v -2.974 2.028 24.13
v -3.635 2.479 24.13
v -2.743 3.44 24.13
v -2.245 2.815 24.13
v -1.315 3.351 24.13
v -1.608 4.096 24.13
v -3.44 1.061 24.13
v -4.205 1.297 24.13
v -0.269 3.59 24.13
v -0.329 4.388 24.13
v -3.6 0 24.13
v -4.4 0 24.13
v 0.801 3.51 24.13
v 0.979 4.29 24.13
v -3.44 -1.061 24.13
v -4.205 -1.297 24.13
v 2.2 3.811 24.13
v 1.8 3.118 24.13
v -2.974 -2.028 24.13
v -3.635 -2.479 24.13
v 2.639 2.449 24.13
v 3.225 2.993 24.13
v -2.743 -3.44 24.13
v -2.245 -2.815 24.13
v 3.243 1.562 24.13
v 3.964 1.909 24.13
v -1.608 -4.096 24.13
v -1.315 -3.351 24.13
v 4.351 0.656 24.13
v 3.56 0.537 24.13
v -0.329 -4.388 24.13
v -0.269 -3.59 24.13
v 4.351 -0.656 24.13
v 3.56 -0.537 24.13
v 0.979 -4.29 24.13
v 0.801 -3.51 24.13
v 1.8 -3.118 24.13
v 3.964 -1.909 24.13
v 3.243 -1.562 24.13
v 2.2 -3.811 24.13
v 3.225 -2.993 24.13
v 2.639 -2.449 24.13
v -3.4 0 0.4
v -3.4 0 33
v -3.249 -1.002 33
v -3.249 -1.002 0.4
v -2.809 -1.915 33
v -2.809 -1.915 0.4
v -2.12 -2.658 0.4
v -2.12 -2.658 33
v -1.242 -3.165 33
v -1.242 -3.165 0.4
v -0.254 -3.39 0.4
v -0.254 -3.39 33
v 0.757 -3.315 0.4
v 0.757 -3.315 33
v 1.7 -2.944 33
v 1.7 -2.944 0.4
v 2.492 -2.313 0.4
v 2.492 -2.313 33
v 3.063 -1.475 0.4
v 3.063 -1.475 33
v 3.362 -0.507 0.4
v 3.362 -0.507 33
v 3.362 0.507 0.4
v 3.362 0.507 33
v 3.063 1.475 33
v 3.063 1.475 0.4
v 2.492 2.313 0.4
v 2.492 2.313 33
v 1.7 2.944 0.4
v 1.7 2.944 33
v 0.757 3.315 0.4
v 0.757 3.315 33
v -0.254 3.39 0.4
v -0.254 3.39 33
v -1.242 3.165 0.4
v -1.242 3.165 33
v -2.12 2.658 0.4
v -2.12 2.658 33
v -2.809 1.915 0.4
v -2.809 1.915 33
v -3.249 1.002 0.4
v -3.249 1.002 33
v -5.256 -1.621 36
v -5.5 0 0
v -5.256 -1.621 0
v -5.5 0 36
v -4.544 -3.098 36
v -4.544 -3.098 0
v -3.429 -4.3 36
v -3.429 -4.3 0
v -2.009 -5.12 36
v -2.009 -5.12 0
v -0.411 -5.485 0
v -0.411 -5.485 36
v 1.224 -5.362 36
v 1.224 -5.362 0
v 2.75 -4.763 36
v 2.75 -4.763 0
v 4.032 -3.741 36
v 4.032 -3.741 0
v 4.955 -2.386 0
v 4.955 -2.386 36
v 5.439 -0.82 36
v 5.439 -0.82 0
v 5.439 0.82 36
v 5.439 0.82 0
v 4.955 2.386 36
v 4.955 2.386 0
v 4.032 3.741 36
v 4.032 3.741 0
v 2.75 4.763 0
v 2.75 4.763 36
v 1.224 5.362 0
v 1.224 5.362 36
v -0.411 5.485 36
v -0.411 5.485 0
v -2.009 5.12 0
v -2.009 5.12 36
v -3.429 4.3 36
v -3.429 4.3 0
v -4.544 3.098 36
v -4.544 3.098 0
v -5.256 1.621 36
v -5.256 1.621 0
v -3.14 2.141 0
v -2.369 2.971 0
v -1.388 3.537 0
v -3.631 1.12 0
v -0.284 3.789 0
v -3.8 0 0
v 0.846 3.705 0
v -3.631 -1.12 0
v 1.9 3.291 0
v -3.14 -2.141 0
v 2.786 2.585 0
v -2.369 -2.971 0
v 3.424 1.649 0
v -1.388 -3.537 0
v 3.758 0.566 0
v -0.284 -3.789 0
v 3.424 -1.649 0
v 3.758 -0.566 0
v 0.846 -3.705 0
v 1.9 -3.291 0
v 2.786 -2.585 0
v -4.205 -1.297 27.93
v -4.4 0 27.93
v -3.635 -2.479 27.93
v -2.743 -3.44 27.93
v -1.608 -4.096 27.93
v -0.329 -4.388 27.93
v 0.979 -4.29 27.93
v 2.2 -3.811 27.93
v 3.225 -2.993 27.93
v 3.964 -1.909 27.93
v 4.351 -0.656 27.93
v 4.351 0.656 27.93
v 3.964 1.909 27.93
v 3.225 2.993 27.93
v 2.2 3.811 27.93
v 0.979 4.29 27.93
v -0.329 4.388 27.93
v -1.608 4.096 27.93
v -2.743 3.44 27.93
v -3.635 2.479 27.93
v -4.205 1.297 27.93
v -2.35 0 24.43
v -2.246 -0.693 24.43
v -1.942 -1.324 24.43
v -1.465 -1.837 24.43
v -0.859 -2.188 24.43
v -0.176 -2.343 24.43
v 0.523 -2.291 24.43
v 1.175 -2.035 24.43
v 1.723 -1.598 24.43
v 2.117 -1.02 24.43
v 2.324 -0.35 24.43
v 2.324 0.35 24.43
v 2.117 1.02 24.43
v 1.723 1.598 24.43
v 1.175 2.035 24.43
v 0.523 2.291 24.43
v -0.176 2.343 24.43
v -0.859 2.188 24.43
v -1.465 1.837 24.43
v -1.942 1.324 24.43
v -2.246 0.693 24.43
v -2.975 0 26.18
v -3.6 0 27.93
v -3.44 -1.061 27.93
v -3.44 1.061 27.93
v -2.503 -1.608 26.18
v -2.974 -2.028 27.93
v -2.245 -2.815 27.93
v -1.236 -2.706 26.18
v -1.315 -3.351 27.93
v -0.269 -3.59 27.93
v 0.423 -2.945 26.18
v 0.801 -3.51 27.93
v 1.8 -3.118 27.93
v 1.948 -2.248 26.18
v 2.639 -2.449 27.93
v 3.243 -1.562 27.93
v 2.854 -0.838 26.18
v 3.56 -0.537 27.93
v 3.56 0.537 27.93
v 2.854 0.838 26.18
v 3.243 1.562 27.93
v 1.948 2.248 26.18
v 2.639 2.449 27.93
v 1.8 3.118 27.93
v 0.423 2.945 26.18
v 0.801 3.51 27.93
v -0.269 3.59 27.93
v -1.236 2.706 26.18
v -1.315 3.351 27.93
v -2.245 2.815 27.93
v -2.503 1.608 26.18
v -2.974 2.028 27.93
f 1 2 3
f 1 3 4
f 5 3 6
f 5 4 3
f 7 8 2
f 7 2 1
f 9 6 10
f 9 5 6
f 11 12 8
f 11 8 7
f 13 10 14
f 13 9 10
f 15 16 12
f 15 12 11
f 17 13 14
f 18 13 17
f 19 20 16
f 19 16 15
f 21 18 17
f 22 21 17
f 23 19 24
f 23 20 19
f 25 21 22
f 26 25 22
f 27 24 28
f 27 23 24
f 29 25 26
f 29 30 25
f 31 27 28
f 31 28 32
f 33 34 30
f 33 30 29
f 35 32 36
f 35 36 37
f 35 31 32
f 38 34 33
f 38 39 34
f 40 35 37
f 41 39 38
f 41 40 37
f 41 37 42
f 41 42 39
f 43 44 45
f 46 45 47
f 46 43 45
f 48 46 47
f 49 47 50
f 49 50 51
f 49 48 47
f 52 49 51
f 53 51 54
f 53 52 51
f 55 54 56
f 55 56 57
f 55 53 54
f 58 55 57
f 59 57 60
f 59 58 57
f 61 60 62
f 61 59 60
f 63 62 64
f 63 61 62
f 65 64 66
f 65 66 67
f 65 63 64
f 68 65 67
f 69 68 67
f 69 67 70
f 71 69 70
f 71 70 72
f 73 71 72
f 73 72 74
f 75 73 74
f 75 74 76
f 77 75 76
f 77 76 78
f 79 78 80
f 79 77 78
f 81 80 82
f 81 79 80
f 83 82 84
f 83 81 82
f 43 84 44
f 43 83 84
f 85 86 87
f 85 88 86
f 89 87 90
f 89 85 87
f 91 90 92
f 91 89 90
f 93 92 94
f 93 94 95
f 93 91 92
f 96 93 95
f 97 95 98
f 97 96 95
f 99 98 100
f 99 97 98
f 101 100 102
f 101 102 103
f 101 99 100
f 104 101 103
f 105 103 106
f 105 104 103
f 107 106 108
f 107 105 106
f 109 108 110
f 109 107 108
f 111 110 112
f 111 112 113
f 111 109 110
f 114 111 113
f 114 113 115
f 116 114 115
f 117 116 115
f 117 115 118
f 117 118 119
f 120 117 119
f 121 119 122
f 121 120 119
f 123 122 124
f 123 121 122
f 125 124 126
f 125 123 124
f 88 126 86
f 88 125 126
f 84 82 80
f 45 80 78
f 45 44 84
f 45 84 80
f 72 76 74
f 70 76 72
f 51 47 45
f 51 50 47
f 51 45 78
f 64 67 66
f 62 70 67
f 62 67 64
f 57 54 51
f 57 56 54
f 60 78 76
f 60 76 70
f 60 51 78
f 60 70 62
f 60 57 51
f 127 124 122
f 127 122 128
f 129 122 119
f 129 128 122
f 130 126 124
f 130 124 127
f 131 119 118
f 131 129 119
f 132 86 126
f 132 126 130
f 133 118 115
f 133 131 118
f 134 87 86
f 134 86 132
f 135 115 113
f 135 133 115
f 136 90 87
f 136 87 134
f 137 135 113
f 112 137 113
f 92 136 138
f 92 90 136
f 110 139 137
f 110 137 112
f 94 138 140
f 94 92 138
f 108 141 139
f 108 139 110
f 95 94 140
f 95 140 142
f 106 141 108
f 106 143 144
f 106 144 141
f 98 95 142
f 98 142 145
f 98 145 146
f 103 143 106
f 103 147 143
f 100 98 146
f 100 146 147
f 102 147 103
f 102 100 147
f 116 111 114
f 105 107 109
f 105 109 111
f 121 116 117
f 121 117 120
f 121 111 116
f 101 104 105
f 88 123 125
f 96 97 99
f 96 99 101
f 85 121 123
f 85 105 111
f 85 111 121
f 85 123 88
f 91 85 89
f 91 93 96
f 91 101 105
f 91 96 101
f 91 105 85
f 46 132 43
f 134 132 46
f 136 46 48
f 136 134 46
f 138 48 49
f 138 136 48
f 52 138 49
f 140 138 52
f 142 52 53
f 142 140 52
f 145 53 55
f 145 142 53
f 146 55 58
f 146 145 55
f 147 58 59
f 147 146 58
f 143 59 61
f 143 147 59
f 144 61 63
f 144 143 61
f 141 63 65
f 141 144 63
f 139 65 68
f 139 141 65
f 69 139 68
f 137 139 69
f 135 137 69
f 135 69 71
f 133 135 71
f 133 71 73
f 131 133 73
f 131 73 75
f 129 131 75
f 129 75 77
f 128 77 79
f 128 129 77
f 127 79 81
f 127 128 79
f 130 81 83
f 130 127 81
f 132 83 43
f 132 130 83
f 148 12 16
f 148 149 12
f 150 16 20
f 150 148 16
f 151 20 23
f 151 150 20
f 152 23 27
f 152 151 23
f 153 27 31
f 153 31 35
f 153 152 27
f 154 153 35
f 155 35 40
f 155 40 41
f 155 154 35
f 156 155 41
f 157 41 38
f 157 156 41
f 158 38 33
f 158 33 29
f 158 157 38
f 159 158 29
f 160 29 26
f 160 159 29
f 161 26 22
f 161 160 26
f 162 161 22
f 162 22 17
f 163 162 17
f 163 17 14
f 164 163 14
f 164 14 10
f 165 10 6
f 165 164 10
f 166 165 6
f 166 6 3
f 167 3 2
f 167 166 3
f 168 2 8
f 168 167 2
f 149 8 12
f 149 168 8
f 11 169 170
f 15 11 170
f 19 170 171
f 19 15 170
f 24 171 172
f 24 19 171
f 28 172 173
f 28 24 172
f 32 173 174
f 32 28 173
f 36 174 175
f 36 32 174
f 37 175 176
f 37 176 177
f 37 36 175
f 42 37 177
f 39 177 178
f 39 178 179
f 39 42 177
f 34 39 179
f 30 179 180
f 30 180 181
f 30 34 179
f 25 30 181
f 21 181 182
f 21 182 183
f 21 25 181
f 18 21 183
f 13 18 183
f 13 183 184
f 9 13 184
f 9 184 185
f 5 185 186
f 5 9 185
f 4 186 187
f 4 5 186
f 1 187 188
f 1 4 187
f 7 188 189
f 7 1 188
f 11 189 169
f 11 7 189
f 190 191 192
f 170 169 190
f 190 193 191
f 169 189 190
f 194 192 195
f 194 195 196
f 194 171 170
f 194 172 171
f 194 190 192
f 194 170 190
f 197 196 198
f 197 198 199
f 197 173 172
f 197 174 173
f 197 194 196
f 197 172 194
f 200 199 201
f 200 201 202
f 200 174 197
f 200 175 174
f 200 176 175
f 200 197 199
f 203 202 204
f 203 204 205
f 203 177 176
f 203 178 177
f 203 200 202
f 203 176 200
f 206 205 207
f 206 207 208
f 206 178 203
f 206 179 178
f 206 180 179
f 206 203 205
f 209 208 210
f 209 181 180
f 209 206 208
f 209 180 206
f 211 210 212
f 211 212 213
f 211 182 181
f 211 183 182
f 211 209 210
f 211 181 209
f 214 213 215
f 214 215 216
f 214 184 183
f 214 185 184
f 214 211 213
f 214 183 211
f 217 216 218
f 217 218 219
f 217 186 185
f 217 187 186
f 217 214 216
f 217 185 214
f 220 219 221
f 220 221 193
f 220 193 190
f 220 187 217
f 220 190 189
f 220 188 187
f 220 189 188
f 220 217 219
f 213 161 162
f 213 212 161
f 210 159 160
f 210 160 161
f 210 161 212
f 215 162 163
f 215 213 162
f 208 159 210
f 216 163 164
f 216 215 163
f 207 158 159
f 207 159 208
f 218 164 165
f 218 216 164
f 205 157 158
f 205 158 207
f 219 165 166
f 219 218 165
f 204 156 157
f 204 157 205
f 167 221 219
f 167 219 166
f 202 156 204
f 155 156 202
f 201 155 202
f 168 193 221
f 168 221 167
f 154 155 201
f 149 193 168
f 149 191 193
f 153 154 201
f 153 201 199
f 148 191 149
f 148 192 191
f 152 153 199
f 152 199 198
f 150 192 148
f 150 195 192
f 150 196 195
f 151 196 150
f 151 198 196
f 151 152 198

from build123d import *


with BuildPart() as part:
    # Sketch1 → Bore (revolve)
    with BuildSketch(Plane(origin=(0, 0, 0), x_dir=(-1, 0, 0), z_dir=(0, 1, 0)), mode=Mode.PRIVATE) as bore_sk:
        Polygon((-3.8, 0), (-5.5, 0), (-5.5, 36), (0, 36), (0, 33), (-3.4, 33), (-3.4, 0.4), align=None)
    revolve(bore_sk.sketch.rotate(Axis((0, 0, -200), (0, 0, 1)), 180), axis=Axis((0, 0, -200), (0, 0, 1)))


with BuildPart() as body_2:
    # Sketch2 → Detent (revolve)
    with BuildSketch(Plane(origin=(0, 0, 0), x_dir=(-1, 0, 0), z_dir=(0, 1, 0)), mode=Mode.PRIVATE) as detent_sk:
        Polygon((-3.6, 24.13), (-4.4, 24.13), (-4.4, 27.93), (-3.6, 27.93), (-2.35, 24.43), align=None)
    revolve(detent_sk.sketch.rotate(Axis((0, 0, -200), (0, 0, 1)), 180), axis=Axis((0, 0, -200), (0, 0, 1)))


solid = Compound([part.part, body_2.part])
